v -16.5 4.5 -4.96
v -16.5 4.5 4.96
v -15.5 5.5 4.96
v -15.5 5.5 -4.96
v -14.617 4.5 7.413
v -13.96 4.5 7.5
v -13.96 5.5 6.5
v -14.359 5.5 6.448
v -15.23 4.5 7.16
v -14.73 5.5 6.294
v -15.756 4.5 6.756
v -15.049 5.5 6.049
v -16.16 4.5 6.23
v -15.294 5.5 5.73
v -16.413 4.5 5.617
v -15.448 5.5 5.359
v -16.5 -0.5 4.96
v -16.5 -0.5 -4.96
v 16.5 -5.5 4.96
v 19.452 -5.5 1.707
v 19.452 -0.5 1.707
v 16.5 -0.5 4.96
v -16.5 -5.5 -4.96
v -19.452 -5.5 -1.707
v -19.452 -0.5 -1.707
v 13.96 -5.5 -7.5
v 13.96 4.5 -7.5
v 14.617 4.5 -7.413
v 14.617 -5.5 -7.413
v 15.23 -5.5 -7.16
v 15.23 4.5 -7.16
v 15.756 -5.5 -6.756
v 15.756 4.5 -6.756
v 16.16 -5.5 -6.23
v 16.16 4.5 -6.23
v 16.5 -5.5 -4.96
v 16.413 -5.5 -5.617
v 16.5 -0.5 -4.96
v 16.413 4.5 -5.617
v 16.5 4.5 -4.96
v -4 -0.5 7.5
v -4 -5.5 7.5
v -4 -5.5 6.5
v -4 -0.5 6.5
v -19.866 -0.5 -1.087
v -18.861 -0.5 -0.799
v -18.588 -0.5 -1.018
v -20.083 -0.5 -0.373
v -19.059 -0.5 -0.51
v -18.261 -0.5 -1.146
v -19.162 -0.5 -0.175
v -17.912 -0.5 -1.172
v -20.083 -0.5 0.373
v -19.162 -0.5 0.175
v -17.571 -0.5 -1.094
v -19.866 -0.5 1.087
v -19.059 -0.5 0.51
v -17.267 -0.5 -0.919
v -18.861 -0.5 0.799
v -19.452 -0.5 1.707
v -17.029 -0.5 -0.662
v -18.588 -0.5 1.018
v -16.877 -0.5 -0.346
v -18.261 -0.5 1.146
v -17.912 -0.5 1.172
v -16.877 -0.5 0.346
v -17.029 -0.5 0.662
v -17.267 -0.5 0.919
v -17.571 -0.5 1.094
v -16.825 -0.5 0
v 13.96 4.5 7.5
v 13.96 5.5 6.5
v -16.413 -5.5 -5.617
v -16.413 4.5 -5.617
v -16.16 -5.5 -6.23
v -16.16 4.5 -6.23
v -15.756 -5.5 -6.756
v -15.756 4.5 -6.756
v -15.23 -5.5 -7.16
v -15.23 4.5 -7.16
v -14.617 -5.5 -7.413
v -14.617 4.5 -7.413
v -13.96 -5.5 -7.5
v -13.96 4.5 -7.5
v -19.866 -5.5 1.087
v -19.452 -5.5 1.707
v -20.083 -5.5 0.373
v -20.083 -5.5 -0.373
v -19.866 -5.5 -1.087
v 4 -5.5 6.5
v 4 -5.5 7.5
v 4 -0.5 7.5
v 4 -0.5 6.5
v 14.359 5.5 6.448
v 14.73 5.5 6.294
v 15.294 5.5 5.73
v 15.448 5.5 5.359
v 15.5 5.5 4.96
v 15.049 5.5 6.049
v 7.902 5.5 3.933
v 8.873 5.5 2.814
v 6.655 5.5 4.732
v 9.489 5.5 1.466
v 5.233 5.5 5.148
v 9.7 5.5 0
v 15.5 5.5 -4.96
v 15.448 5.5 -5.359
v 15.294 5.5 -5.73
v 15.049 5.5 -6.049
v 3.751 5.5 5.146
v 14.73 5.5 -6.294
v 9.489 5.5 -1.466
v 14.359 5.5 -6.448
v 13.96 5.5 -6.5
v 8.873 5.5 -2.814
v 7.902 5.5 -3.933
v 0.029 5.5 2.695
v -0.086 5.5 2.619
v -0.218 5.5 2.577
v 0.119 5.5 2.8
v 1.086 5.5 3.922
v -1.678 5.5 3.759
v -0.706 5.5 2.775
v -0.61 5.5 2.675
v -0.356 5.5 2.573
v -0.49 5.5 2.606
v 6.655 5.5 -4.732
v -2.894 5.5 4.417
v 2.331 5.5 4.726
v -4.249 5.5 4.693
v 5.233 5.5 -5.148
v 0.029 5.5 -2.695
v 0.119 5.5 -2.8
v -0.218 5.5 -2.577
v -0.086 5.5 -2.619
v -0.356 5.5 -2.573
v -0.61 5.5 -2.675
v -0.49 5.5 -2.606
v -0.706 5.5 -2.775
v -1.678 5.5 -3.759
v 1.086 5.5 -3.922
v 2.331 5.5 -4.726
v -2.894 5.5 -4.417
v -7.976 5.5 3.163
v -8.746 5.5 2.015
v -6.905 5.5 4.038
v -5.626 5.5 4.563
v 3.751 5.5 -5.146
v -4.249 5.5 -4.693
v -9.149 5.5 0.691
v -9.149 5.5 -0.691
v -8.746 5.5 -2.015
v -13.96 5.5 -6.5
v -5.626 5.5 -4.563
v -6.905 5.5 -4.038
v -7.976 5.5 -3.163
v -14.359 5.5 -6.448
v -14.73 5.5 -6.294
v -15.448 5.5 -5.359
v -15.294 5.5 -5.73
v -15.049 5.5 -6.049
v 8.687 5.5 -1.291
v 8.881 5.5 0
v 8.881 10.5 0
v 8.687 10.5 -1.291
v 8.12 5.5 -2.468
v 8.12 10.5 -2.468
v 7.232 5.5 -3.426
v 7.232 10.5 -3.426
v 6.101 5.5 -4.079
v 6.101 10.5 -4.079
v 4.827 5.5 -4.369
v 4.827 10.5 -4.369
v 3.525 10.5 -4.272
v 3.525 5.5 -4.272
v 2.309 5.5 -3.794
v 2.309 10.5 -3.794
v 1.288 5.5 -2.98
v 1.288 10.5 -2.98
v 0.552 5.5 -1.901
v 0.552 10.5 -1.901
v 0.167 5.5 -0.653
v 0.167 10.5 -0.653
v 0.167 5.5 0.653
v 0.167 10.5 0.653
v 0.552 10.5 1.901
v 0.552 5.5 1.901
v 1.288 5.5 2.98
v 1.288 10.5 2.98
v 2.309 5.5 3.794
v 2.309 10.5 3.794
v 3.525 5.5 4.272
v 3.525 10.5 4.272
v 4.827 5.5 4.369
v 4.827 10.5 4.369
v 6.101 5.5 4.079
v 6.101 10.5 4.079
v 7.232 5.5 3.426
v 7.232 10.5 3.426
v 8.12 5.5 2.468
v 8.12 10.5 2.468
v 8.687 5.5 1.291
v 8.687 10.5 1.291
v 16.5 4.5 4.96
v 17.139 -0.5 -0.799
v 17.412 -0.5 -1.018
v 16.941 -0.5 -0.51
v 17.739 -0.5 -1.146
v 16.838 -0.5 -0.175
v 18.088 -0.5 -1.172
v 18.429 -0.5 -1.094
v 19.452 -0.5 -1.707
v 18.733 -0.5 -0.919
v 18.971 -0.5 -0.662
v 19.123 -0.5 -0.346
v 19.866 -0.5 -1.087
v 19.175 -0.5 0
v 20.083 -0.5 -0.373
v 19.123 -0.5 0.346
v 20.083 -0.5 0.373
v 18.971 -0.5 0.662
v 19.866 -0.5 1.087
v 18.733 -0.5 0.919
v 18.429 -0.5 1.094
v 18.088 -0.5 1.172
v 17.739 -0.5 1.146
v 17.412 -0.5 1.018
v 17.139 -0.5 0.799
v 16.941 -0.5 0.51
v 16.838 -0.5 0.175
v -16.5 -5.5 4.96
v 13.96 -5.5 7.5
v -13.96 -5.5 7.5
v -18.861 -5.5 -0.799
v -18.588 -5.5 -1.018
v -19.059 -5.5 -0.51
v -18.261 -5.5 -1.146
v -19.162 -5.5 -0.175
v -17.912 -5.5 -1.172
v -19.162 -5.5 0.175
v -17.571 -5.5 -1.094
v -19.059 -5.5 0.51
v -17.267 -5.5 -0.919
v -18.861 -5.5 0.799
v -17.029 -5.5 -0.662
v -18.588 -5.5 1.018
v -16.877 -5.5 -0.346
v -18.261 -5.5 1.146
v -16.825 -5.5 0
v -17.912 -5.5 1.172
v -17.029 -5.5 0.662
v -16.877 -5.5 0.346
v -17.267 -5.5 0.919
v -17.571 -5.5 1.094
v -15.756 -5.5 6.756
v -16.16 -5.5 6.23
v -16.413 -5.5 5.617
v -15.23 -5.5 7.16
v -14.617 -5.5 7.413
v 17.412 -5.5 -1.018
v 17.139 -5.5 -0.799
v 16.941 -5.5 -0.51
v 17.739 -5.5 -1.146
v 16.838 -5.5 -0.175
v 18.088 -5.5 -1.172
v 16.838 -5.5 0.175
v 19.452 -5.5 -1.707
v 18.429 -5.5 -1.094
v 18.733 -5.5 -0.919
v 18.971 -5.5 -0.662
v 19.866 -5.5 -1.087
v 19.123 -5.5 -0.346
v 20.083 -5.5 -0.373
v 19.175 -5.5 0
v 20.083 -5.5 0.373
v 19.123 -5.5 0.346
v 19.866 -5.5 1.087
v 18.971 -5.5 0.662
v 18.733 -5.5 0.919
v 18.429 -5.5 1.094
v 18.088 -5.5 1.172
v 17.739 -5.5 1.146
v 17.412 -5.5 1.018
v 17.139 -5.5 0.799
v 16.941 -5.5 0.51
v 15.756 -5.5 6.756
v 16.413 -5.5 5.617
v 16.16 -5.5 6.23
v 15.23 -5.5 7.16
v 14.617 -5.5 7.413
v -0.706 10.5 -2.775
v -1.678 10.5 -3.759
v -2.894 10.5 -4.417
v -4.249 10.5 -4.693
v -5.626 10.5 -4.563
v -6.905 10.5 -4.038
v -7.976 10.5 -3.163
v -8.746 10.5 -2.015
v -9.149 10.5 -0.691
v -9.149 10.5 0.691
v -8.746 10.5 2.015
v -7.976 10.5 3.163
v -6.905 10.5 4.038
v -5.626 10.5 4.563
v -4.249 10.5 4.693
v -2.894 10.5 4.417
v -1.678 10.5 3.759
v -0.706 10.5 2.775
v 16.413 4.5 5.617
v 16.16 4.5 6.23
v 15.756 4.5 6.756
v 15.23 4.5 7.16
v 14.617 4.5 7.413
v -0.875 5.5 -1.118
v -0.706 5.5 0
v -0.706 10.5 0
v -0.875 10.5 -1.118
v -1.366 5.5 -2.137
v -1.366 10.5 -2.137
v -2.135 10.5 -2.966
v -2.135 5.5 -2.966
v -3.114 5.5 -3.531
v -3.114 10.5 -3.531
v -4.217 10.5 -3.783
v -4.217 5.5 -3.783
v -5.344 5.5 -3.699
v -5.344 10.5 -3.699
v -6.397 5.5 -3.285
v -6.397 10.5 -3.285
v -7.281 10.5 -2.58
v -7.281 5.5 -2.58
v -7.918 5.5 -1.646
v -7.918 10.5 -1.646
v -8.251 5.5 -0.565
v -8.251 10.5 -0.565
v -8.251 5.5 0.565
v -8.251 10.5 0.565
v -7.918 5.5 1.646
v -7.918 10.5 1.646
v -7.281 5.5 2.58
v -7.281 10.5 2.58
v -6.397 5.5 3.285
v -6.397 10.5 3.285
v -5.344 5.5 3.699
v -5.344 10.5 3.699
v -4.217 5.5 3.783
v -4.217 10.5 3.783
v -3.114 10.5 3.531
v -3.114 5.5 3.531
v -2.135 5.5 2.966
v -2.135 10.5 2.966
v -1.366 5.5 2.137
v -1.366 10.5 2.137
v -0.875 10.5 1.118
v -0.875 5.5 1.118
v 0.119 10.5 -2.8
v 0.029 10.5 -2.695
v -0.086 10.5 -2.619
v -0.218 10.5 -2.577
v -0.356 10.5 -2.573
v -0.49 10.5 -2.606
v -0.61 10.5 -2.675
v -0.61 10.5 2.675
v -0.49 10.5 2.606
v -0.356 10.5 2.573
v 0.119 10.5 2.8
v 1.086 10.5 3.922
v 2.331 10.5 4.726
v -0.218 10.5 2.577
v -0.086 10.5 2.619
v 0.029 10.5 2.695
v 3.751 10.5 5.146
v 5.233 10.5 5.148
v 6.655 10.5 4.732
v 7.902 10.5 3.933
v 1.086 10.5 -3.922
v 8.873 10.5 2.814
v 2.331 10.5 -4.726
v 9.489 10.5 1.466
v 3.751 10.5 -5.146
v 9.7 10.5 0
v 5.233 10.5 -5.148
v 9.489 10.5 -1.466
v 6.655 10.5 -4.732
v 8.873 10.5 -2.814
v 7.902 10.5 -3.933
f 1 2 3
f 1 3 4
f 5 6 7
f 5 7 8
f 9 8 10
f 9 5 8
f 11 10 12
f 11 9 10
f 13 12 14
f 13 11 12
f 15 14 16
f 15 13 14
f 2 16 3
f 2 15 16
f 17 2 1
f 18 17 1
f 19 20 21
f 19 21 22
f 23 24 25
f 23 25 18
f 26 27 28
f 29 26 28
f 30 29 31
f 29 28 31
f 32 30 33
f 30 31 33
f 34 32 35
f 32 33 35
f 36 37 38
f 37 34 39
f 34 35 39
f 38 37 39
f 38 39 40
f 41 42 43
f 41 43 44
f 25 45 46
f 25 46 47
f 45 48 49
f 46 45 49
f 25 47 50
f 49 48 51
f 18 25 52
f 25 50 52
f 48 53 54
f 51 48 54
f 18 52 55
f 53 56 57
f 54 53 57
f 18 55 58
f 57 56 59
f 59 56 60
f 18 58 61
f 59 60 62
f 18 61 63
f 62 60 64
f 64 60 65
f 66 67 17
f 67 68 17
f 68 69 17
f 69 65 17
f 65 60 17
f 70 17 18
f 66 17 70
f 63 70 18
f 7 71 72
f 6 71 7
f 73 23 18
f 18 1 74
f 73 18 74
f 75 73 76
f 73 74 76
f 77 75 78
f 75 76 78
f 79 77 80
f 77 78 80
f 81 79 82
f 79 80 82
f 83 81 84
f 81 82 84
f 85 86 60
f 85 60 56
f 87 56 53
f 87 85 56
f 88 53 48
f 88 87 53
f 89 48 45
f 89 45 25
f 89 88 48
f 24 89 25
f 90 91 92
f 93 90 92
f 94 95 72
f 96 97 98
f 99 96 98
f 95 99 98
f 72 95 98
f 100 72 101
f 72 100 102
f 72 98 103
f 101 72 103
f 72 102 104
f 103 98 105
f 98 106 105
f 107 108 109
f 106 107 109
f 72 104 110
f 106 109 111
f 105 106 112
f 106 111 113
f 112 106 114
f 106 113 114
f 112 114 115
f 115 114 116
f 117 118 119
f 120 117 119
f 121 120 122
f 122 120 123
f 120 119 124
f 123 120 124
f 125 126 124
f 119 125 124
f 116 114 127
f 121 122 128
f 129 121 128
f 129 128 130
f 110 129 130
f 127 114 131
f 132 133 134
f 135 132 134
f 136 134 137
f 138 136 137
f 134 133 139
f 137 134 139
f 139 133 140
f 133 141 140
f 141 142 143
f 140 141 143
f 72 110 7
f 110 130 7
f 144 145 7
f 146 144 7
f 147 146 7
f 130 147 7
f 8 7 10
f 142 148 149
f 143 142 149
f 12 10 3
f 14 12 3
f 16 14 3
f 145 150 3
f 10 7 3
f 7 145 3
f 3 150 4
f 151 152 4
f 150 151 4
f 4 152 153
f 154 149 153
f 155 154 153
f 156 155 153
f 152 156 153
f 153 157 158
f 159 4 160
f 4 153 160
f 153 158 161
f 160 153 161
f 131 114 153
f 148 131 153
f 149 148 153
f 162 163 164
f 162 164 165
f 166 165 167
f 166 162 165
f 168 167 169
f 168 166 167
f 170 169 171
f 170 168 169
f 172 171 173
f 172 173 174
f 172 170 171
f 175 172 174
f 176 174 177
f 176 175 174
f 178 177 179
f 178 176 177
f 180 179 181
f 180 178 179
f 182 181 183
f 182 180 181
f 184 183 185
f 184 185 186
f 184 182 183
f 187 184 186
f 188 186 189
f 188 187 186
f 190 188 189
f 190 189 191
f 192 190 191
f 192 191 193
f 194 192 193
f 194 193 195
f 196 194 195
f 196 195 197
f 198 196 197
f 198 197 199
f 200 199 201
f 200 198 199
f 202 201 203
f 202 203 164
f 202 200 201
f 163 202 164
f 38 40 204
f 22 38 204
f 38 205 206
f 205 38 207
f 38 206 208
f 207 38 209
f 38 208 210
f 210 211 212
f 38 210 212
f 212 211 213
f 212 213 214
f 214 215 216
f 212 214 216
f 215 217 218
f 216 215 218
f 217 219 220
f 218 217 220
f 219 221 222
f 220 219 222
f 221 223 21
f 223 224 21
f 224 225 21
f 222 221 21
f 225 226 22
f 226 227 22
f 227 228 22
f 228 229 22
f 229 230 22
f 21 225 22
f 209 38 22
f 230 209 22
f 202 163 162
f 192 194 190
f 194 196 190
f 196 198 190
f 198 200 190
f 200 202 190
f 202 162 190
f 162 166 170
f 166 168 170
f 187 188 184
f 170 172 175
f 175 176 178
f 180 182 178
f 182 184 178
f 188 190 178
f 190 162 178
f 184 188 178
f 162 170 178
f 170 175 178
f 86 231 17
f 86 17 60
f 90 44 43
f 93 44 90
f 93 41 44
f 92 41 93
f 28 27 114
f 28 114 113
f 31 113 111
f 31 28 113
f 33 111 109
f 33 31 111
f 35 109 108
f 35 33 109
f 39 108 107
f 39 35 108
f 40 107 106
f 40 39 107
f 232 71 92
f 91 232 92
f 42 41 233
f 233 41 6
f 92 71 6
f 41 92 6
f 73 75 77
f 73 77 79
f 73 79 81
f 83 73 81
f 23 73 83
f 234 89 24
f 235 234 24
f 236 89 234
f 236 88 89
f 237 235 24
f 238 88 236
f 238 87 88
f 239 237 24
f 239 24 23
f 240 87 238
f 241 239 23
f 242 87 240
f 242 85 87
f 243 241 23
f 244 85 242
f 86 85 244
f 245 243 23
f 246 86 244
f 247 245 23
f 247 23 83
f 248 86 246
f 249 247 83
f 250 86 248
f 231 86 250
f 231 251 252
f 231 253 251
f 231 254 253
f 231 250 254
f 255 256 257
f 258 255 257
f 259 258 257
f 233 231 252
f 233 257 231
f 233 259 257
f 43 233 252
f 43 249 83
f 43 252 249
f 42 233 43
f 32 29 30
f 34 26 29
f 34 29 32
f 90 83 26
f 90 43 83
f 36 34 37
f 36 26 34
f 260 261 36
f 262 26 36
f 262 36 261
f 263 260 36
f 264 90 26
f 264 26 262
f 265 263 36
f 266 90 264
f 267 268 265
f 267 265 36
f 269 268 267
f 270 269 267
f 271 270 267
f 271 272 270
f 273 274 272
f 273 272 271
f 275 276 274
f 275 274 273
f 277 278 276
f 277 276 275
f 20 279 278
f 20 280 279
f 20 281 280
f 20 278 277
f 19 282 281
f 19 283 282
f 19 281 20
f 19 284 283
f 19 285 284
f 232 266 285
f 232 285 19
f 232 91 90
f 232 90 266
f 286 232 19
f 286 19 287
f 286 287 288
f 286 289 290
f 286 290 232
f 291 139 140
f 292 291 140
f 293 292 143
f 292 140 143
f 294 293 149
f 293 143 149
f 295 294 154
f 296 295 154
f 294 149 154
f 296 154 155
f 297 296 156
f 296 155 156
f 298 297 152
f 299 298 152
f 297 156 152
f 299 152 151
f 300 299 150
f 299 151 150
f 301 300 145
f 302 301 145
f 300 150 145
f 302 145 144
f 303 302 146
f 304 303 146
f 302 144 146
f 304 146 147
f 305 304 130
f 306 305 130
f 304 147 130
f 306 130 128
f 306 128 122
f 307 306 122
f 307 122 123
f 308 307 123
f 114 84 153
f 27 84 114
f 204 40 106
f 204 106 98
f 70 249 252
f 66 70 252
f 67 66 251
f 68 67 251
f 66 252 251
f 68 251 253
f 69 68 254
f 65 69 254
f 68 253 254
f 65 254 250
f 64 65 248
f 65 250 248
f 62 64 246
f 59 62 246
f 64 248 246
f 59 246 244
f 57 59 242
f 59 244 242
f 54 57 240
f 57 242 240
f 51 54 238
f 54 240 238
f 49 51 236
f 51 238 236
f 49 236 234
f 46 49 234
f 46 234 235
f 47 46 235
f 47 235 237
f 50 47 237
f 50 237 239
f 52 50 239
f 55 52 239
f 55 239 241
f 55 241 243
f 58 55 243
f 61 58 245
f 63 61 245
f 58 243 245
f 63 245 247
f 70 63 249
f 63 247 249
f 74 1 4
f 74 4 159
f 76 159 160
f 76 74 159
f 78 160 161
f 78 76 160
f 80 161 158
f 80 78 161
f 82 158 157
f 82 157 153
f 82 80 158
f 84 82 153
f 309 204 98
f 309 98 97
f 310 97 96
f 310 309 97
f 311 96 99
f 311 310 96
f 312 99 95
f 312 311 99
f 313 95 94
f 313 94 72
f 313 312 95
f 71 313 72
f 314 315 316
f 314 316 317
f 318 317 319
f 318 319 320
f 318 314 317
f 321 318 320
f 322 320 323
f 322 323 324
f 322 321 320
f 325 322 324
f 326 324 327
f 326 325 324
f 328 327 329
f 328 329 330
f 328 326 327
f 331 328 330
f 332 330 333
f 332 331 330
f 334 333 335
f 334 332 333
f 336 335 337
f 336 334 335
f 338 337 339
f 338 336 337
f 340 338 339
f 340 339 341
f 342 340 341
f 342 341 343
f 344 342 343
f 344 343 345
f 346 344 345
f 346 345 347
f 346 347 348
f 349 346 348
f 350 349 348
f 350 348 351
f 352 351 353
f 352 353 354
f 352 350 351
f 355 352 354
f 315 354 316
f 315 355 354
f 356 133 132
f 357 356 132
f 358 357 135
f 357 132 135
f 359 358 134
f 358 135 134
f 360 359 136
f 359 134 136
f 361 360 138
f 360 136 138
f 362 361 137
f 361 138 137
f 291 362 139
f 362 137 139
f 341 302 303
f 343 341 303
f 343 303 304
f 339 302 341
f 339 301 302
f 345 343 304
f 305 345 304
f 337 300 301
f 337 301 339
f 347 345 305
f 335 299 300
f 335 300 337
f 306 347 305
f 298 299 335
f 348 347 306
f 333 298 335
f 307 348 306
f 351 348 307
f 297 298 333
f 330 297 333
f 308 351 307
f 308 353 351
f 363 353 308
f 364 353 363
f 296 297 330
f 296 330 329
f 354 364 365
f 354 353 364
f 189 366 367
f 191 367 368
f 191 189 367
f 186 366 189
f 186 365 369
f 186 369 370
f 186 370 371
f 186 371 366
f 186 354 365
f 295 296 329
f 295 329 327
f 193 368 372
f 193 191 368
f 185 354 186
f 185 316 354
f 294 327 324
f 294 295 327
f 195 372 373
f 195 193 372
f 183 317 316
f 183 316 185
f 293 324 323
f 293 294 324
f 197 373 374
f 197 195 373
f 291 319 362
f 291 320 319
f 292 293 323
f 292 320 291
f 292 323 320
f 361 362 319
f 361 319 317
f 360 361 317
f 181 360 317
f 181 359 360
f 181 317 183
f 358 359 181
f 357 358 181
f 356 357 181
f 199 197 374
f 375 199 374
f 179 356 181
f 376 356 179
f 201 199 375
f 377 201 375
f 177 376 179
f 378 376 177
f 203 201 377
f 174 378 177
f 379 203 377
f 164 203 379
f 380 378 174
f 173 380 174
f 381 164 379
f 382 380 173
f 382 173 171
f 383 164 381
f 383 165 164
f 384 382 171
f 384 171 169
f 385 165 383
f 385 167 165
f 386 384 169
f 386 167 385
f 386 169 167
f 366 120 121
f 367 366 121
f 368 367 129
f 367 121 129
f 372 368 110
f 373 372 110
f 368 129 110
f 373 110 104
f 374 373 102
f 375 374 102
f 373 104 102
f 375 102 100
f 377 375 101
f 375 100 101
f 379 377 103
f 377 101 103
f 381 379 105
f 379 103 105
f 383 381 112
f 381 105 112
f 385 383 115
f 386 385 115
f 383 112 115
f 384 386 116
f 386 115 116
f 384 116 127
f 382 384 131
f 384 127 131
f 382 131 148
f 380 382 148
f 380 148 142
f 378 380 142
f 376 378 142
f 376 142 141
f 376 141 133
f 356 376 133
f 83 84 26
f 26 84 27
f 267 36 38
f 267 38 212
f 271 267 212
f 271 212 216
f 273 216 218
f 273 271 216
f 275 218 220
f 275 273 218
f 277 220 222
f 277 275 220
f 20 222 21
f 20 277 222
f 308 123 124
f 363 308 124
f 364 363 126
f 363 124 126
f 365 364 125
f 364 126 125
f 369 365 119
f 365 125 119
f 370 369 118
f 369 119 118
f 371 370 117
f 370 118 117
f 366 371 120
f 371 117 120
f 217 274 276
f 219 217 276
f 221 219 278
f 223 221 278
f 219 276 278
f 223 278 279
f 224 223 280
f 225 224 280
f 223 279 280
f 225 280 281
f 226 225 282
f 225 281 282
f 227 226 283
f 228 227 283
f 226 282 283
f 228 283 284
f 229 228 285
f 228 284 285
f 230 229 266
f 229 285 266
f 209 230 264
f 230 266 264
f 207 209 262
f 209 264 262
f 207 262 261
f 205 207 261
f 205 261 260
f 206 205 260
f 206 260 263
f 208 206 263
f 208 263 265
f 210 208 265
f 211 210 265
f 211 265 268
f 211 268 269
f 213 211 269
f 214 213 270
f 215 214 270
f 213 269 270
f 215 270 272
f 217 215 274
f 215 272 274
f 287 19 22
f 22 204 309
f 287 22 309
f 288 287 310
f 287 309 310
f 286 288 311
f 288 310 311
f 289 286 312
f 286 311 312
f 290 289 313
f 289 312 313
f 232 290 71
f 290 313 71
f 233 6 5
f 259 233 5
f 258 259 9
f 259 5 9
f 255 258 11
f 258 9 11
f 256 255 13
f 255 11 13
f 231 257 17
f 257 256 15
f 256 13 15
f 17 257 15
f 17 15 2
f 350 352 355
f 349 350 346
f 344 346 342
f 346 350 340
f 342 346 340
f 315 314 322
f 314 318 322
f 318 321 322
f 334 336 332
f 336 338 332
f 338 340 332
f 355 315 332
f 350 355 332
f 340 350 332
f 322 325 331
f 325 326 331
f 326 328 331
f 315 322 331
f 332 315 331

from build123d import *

# Parameters (mm, degrees)
BOSS_EXTRUDE1_DEPTH = 5.5
SKETCH2_R           = 1.175
BOSS_EXTRUDE2_DEPTH = 5
CHAMFER1_SIZE       = 1
SKETCH3_R           = 3.793643162
SKETCH3_R_2         = 4.381481481
BOSS_EXTRUDE3_DEPTH = 5
SKETCH4_W           = 8
SKETCH4_H           = 5
CUT_EXTRUDE1_DEPTH  = 1


with BuildPart() as part:
    # Sketch1 → Boss-Extrude1 (new body, symmetric)
    with BuildSketch(Plane(origin=(0, 0, 0), x_dir=(1, 0, 0), z_dir=(0, 1, 0))):
        with BuildLine():
            Line((-13.96, 7.5), (13.96, 7.5))
            ThreePointArc((13.96, 7.5), (15.756051224, 6.756051224), (16.5, 4.96))
            Line((16.5, 4.96), (16.5, -4.96))
            ThreePointArc((16.5, -4.96), (15.756051224, -6.756051224), (13.96, -7.5))
            Line((13.96, -7.5), (-13.96, -7.5))
            ThreePointArc((-13.96, -7.5), (-15.756051224, -6.756051224), (-16.5, -4.96))
            Line((-16.5, -4.96), (-16.5, 4.96))
            ThreePointArc((-16.5, 4.96), (-15.756051224, 6.756051224), (-13.96, 7.5))
        make_face()
    extrude(amount=BOSS_EXTRUDE1_DEPTH, both=True)

    # Sketch2 → Boss-Extrude2 (add)
    with BuildSketch(Plane.XZ.offset(5.5)):
        with BuildLine():
            Line((-16.5, 4.96), (-19.451582405, 1.706700282))
            ThreePointArc((-19.451582405, 1.706700282), (-20.110419428, 0), (-19.451582405, -1.706700282))
            Line((-19.451582405, -1.706700282), (-16.5, -4.96))
            Line((-16.5, -4.96), (16.5, -4.96))
            Line((16.5, -4.96), (19.451582406, -1.706700282))
            ThreePointArc((19.451582406, -1.706700282), (20.110419428, 0), (19.451582405, 1.706700282))
            Line((19.451582405, 1.706700282), (16.5, 4.96))
            Line((16.5, 4.96), (-15.93880857, 4.96))
            Line((-15.93880857, 4.96), (-16.5, 4.96))
        make_face()
        with Locations((-18, 0)):
            Circle(SKETCH2_R, mode=Mode.SUBTRACT)
        with Locations((18, 0)):
            Circle(SKETCH2_R, mode=Mode.SUBTRACT)
    extrude(amount=-BOSS_EXTRUDE2_DEPTH)

    # Chamfer1
    chamfer1_edges = [part.edges().sort_by_distance(p)[0] for p in [
        (-15.756051224, 5.5, -6.756051224),
        (-16.5, 5.5, 0),
        (-15.756051224, 5.5, 6.756051224),
        (0, 5.5, 7.5),
        (15.756051224, 5.5, 6.756051224),
        (16.5, 5.5, 0),
        (15.756051224, 5.5, -6.756051224),
        (0, 5.5, -7.5),
    ]]
    chamfer(chamfer1_edges, length=CHAMFER1_SIZE)

    # Sketch3 → Boss-Extrude3 (add)
    with BuildSketch(Plane(origin=(0, 5.5, 0), x_dir=(1, 0, 0), z_dir=(0, 1, 0))):
        with BuildLine():
            ThreePointArc((-0.706356838, 2.774575924), (-9.2, 0), (-0.706356838, -2.774575924))
            ThreePointArc((-0.706356838, -2.774575924), (-0.287091072, -2.569989708), (0.118518519, -2.800467823))
            ThreePointArc((0.118518519, -2.800467823), (9.7, 0), (0.118518519, 2.800467823))
            ThreePointArc((0.118518519, 2.800467823), (-0.287091072, 2.569989708), (-0.706356838, 2.774575924))
        make_face()
        with Locations((-4.5, 0)):
            Circle(SKETCH3_R, mode=Mode.SUBTRACT)
        with Locations((4.5, 0)):
            Circle(SKETCH3_R_2, mode=Mode.SUBTRACT)
    extrude(amount=BOSS_EXTRUDE3_DEPTH)

    # Sketch4 → Cut-Extrude1 (cut)
    with BuildSketch(Plane.XY.offset(7.5)):
        with Locations((0, -3)):
            Rectangle(SKETCH4_W, SKETCH4_H)
    extrude(amount=-CUT_EXTRUDE1_DEPTH, mode=Mode.SUBTRACT)


solid = part.part
